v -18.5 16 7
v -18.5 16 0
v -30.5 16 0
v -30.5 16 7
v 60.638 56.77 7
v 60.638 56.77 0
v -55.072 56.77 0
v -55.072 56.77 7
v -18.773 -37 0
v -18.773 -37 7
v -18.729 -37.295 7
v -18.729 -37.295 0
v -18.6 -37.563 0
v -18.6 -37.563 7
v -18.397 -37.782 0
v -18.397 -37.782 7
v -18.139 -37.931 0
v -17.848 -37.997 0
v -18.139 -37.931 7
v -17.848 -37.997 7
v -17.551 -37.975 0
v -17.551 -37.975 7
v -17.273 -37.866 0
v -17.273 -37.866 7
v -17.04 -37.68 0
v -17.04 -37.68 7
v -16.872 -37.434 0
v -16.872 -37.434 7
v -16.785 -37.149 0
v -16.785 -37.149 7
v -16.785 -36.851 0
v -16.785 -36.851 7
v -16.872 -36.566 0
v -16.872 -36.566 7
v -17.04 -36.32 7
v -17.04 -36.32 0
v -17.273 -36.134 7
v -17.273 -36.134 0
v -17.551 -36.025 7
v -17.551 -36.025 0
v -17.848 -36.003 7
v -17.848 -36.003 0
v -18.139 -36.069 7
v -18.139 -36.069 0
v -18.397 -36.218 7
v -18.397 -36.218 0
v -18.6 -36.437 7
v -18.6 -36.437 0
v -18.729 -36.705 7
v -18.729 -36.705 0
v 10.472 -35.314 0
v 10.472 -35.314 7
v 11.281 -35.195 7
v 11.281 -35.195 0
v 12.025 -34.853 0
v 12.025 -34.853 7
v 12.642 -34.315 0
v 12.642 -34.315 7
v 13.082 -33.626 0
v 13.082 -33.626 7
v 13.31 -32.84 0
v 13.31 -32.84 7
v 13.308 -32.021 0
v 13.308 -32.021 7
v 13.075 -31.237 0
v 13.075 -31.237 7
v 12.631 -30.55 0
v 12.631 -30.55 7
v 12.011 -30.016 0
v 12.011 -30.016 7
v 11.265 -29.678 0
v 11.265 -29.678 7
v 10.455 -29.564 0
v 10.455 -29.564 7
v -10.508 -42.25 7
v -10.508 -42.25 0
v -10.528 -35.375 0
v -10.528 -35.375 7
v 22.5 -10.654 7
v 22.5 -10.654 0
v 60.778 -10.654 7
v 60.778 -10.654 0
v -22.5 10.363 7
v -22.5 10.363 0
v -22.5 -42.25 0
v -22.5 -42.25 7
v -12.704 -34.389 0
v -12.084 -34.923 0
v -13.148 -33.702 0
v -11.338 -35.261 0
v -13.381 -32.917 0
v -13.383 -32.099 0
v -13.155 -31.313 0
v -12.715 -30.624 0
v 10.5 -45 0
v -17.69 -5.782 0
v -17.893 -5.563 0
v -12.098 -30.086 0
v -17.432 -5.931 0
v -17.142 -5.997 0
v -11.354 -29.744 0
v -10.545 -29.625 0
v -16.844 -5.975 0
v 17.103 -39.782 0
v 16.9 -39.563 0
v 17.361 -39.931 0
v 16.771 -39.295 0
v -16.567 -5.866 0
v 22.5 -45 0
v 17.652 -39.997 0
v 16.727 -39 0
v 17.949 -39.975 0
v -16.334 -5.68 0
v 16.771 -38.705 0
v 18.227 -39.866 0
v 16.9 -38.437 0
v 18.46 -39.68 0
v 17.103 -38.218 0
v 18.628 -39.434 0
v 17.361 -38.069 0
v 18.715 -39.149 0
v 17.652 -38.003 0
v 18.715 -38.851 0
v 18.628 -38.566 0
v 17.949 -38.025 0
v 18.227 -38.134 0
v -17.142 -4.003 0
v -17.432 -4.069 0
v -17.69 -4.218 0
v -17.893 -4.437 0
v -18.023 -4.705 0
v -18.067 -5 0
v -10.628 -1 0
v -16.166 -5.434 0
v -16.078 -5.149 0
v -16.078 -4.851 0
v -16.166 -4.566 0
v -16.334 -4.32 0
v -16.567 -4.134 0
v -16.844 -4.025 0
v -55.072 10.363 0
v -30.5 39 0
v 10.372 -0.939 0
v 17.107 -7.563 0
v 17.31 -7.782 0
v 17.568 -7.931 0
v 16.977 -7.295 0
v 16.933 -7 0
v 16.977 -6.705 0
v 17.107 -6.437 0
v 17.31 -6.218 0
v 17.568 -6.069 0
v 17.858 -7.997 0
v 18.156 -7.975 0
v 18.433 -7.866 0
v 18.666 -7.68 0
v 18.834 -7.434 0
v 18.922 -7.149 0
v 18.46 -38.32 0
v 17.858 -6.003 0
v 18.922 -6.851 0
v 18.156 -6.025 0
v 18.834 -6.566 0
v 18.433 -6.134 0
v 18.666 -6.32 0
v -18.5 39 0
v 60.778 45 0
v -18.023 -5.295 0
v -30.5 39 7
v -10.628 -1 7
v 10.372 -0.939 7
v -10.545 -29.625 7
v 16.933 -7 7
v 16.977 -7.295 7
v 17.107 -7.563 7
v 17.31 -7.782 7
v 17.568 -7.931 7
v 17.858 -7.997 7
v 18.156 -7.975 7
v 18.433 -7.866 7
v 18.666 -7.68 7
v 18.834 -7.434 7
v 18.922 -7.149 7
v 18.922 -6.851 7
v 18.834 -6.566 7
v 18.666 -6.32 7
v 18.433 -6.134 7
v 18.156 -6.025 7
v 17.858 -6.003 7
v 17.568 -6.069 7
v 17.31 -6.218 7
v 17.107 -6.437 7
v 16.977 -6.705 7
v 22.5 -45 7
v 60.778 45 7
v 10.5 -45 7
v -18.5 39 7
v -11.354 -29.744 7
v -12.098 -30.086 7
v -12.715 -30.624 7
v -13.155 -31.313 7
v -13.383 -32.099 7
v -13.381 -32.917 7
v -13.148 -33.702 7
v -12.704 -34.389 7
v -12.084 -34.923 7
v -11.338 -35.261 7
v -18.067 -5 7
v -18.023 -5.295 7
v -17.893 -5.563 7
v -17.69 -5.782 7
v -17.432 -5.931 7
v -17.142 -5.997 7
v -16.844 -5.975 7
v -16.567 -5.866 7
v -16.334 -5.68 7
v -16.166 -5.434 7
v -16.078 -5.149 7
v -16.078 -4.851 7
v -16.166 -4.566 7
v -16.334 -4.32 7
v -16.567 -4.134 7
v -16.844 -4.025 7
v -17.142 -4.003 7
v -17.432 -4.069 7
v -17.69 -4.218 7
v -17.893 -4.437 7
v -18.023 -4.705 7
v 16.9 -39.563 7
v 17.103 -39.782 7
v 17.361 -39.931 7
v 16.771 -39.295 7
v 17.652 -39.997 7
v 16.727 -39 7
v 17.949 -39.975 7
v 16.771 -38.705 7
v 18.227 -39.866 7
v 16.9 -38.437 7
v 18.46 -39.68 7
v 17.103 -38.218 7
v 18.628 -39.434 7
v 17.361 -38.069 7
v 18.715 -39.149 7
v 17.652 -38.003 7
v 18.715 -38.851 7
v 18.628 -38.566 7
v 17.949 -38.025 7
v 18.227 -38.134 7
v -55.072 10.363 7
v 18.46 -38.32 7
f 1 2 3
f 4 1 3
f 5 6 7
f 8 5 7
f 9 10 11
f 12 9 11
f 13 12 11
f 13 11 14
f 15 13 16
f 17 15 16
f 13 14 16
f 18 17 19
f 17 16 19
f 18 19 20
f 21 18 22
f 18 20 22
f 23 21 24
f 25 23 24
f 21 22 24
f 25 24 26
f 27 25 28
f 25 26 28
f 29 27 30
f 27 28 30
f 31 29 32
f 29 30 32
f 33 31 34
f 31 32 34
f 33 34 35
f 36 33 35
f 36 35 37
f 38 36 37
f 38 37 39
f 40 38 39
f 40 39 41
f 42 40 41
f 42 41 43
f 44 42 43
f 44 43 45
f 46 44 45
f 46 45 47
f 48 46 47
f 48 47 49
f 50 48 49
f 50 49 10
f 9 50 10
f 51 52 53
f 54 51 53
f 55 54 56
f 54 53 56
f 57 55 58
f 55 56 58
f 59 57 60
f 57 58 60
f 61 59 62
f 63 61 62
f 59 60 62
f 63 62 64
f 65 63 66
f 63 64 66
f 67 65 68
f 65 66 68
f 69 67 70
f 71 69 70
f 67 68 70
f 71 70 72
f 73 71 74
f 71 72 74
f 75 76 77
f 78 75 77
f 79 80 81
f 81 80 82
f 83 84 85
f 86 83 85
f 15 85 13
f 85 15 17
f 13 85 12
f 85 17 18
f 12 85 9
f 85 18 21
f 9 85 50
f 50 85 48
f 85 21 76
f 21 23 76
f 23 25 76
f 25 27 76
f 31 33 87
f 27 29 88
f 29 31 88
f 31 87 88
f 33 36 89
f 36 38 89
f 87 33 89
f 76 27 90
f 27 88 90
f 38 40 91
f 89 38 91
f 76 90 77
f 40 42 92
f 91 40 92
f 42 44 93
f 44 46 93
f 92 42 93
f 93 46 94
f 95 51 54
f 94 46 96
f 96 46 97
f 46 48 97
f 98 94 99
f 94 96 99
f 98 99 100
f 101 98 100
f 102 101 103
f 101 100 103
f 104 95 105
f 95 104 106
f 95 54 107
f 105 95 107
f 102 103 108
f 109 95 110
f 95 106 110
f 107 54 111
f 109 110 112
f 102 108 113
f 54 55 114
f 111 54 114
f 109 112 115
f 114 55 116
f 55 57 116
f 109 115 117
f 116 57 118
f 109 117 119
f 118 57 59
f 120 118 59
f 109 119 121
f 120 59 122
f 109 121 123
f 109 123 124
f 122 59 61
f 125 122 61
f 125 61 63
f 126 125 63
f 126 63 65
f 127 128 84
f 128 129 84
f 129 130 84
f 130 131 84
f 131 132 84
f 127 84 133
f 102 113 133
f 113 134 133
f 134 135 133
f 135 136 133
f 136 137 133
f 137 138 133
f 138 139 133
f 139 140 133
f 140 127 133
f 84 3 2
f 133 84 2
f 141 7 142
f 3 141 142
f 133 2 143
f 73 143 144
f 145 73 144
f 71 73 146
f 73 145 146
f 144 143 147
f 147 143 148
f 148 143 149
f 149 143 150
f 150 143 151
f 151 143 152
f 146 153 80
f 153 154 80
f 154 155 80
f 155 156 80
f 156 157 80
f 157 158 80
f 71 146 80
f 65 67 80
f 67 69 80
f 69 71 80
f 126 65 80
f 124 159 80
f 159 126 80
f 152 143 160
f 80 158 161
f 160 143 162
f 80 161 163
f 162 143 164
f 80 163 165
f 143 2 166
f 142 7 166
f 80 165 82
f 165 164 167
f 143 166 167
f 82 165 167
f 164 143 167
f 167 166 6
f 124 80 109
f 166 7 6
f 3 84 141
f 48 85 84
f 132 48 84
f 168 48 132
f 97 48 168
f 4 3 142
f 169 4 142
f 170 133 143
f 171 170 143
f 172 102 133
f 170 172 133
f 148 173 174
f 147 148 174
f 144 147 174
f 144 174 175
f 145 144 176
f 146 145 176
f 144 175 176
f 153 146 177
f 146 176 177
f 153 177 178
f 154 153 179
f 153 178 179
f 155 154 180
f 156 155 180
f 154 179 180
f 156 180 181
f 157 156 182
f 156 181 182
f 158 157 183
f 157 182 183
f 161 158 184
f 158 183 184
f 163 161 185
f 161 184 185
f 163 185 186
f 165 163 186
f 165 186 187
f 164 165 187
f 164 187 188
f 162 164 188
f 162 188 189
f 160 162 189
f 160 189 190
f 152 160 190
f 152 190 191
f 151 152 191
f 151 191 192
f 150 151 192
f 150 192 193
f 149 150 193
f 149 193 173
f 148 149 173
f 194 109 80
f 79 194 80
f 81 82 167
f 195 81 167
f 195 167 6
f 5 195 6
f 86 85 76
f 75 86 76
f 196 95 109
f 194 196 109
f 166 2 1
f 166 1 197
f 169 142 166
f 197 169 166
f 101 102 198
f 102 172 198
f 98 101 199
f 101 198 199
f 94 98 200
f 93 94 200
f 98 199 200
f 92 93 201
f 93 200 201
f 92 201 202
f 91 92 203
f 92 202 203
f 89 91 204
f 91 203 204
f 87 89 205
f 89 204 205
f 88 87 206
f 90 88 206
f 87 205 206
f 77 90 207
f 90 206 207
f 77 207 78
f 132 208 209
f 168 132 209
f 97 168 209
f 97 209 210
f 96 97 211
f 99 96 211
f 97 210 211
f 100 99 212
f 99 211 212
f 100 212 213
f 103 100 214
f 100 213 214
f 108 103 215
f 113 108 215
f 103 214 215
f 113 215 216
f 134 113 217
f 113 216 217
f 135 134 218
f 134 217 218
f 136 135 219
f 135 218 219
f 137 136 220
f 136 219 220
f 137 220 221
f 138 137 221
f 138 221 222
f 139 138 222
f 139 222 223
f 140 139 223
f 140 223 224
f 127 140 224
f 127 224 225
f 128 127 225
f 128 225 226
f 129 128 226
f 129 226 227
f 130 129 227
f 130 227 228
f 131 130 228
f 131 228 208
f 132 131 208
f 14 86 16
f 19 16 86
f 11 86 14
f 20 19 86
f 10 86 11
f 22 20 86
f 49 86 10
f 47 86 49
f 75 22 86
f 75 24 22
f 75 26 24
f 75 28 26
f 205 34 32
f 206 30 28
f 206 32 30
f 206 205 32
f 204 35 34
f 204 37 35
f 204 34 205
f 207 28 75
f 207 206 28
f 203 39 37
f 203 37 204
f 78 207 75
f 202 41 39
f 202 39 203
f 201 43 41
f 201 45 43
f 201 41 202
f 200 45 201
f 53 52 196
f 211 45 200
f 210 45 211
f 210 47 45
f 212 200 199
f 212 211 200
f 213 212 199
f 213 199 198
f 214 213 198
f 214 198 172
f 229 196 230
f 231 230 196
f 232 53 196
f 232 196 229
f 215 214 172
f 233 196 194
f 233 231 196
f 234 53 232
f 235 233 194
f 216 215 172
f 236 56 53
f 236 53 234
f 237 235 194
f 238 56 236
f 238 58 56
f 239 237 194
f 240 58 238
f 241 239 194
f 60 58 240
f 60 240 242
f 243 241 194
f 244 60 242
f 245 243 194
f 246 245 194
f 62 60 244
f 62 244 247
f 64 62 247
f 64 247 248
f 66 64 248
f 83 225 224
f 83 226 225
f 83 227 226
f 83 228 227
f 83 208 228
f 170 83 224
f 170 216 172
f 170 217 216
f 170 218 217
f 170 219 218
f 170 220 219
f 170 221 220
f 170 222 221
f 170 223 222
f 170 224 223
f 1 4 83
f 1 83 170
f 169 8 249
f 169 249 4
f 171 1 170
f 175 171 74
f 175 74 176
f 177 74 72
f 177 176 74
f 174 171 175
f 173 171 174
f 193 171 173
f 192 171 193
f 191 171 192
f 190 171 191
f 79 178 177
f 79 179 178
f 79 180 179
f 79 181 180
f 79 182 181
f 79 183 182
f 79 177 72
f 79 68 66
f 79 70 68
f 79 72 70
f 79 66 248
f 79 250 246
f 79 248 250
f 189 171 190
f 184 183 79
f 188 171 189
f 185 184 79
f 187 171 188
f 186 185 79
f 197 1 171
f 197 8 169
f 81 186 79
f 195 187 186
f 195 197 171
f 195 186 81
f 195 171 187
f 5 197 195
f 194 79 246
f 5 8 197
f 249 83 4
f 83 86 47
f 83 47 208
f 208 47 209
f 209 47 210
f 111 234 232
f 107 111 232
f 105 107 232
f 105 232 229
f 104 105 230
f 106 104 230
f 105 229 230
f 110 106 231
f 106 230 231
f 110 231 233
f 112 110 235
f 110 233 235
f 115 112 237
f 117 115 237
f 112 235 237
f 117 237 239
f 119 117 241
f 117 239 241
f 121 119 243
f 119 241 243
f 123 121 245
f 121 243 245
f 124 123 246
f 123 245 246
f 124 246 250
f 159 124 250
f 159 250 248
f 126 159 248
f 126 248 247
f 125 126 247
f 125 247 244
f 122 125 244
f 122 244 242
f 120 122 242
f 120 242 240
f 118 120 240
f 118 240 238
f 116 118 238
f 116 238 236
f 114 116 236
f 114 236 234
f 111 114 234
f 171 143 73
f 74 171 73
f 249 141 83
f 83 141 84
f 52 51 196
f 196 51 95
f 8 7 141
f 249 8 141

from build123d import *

# Parameters (mm, degrees)
F0_W     = 8
F0_H     = 6
F0_H_2   = 5.6374937892
F0_W_2   = 4
F0_H_3   = 23
F1_DEPTH = 7
F2_D     = 2
F3_D     = 5.75


with BuildPart() as f1:
    # F0 (on Top) → F1 (new body)
    with BuildSketch(Plane.XY):
        Polygon((10.5, -45), (22.5, -45), (22.5, -10.6539065018), (22.5, 17.153987661), (0, 45), (-14.5, 45), (-14.5, 39), (-14.5, 16), (-14.5, 10.3625062108), (-22.5, 10.3625062108), (-22.5, -42.25), (-10.5080957781, -42.25), (-10.6281967604, -1.0001864958), (10.3717142302, -0.9390441602), align=None)
        Polygon((0, 45), (22.5, 17.153987661), (22.5, 45), align=None)
        Polygon((-30.5, 39), (-30.5, 45), (-55.0723059862, 45), (-55.0723059862, 10.3625062108), (-30.5, 10.3625062108), (-30.5, 16), align=None)
        with Locations((-26.5, 42)):
            Rectangle(F0_W, F0_H)
        Polygon((-14.5, 39), (-14.5, 45), (-22.5, 45), (-22.5, 39), (-18.5, 39), align=None)
        Polygon((-22.5, 16), (-22.5, 10.3625062108), (-14.5, 10.3625062108), (-14.5, 16), (-18.5, 16), align=None)
        with Locations((-26.5, 13.1812531054)):
            Rectangle(F0_W, F0_H_2)
        Polygon((22.5, 17.153987661), (22.5, -10.6539065018), (60.7781559229, -10.6539065018), (60.7781559229, 45), (22.5, 45), align=None)
        Polygon((0, 45), (22.5, 45), (60.7781559229, 45), (60.6384575367, 56.7700602114), (-55.0723059862, 56.7700602114), (-55.0723059862, 45), (-30.5, 45), (-22.5, 45), (-14.5, 45), align=None)
        with Locations((-16.5, 27.5)):
            Rectangle(F0_W_2, F0_H_3)
    extrude(amount=F1_DEPTH)

    # F2 (through all)
    with Locations(Plane(origin=(0, 0, 0), x_dir=(1, 0, 0), z_dir=(0, 0, -1))):
        with Locations((-17.0669870824, 5), (-17.7734121563, 37), (17.7265878437, 39), (17.9330129176, 7)):
            Hole(F2_D / 2)

    # F3 (through all)
    with Locations(Plane(origin=(0, 0, 0), x_dir=(1, 0, 0), z_dir=(0, 0, -1))):
        with Locations((-10.5364832571, 32.5000529818), (10.4634277335, 32.4389106462)):
            Hole(F3_D / 2)


solid = f1.part
